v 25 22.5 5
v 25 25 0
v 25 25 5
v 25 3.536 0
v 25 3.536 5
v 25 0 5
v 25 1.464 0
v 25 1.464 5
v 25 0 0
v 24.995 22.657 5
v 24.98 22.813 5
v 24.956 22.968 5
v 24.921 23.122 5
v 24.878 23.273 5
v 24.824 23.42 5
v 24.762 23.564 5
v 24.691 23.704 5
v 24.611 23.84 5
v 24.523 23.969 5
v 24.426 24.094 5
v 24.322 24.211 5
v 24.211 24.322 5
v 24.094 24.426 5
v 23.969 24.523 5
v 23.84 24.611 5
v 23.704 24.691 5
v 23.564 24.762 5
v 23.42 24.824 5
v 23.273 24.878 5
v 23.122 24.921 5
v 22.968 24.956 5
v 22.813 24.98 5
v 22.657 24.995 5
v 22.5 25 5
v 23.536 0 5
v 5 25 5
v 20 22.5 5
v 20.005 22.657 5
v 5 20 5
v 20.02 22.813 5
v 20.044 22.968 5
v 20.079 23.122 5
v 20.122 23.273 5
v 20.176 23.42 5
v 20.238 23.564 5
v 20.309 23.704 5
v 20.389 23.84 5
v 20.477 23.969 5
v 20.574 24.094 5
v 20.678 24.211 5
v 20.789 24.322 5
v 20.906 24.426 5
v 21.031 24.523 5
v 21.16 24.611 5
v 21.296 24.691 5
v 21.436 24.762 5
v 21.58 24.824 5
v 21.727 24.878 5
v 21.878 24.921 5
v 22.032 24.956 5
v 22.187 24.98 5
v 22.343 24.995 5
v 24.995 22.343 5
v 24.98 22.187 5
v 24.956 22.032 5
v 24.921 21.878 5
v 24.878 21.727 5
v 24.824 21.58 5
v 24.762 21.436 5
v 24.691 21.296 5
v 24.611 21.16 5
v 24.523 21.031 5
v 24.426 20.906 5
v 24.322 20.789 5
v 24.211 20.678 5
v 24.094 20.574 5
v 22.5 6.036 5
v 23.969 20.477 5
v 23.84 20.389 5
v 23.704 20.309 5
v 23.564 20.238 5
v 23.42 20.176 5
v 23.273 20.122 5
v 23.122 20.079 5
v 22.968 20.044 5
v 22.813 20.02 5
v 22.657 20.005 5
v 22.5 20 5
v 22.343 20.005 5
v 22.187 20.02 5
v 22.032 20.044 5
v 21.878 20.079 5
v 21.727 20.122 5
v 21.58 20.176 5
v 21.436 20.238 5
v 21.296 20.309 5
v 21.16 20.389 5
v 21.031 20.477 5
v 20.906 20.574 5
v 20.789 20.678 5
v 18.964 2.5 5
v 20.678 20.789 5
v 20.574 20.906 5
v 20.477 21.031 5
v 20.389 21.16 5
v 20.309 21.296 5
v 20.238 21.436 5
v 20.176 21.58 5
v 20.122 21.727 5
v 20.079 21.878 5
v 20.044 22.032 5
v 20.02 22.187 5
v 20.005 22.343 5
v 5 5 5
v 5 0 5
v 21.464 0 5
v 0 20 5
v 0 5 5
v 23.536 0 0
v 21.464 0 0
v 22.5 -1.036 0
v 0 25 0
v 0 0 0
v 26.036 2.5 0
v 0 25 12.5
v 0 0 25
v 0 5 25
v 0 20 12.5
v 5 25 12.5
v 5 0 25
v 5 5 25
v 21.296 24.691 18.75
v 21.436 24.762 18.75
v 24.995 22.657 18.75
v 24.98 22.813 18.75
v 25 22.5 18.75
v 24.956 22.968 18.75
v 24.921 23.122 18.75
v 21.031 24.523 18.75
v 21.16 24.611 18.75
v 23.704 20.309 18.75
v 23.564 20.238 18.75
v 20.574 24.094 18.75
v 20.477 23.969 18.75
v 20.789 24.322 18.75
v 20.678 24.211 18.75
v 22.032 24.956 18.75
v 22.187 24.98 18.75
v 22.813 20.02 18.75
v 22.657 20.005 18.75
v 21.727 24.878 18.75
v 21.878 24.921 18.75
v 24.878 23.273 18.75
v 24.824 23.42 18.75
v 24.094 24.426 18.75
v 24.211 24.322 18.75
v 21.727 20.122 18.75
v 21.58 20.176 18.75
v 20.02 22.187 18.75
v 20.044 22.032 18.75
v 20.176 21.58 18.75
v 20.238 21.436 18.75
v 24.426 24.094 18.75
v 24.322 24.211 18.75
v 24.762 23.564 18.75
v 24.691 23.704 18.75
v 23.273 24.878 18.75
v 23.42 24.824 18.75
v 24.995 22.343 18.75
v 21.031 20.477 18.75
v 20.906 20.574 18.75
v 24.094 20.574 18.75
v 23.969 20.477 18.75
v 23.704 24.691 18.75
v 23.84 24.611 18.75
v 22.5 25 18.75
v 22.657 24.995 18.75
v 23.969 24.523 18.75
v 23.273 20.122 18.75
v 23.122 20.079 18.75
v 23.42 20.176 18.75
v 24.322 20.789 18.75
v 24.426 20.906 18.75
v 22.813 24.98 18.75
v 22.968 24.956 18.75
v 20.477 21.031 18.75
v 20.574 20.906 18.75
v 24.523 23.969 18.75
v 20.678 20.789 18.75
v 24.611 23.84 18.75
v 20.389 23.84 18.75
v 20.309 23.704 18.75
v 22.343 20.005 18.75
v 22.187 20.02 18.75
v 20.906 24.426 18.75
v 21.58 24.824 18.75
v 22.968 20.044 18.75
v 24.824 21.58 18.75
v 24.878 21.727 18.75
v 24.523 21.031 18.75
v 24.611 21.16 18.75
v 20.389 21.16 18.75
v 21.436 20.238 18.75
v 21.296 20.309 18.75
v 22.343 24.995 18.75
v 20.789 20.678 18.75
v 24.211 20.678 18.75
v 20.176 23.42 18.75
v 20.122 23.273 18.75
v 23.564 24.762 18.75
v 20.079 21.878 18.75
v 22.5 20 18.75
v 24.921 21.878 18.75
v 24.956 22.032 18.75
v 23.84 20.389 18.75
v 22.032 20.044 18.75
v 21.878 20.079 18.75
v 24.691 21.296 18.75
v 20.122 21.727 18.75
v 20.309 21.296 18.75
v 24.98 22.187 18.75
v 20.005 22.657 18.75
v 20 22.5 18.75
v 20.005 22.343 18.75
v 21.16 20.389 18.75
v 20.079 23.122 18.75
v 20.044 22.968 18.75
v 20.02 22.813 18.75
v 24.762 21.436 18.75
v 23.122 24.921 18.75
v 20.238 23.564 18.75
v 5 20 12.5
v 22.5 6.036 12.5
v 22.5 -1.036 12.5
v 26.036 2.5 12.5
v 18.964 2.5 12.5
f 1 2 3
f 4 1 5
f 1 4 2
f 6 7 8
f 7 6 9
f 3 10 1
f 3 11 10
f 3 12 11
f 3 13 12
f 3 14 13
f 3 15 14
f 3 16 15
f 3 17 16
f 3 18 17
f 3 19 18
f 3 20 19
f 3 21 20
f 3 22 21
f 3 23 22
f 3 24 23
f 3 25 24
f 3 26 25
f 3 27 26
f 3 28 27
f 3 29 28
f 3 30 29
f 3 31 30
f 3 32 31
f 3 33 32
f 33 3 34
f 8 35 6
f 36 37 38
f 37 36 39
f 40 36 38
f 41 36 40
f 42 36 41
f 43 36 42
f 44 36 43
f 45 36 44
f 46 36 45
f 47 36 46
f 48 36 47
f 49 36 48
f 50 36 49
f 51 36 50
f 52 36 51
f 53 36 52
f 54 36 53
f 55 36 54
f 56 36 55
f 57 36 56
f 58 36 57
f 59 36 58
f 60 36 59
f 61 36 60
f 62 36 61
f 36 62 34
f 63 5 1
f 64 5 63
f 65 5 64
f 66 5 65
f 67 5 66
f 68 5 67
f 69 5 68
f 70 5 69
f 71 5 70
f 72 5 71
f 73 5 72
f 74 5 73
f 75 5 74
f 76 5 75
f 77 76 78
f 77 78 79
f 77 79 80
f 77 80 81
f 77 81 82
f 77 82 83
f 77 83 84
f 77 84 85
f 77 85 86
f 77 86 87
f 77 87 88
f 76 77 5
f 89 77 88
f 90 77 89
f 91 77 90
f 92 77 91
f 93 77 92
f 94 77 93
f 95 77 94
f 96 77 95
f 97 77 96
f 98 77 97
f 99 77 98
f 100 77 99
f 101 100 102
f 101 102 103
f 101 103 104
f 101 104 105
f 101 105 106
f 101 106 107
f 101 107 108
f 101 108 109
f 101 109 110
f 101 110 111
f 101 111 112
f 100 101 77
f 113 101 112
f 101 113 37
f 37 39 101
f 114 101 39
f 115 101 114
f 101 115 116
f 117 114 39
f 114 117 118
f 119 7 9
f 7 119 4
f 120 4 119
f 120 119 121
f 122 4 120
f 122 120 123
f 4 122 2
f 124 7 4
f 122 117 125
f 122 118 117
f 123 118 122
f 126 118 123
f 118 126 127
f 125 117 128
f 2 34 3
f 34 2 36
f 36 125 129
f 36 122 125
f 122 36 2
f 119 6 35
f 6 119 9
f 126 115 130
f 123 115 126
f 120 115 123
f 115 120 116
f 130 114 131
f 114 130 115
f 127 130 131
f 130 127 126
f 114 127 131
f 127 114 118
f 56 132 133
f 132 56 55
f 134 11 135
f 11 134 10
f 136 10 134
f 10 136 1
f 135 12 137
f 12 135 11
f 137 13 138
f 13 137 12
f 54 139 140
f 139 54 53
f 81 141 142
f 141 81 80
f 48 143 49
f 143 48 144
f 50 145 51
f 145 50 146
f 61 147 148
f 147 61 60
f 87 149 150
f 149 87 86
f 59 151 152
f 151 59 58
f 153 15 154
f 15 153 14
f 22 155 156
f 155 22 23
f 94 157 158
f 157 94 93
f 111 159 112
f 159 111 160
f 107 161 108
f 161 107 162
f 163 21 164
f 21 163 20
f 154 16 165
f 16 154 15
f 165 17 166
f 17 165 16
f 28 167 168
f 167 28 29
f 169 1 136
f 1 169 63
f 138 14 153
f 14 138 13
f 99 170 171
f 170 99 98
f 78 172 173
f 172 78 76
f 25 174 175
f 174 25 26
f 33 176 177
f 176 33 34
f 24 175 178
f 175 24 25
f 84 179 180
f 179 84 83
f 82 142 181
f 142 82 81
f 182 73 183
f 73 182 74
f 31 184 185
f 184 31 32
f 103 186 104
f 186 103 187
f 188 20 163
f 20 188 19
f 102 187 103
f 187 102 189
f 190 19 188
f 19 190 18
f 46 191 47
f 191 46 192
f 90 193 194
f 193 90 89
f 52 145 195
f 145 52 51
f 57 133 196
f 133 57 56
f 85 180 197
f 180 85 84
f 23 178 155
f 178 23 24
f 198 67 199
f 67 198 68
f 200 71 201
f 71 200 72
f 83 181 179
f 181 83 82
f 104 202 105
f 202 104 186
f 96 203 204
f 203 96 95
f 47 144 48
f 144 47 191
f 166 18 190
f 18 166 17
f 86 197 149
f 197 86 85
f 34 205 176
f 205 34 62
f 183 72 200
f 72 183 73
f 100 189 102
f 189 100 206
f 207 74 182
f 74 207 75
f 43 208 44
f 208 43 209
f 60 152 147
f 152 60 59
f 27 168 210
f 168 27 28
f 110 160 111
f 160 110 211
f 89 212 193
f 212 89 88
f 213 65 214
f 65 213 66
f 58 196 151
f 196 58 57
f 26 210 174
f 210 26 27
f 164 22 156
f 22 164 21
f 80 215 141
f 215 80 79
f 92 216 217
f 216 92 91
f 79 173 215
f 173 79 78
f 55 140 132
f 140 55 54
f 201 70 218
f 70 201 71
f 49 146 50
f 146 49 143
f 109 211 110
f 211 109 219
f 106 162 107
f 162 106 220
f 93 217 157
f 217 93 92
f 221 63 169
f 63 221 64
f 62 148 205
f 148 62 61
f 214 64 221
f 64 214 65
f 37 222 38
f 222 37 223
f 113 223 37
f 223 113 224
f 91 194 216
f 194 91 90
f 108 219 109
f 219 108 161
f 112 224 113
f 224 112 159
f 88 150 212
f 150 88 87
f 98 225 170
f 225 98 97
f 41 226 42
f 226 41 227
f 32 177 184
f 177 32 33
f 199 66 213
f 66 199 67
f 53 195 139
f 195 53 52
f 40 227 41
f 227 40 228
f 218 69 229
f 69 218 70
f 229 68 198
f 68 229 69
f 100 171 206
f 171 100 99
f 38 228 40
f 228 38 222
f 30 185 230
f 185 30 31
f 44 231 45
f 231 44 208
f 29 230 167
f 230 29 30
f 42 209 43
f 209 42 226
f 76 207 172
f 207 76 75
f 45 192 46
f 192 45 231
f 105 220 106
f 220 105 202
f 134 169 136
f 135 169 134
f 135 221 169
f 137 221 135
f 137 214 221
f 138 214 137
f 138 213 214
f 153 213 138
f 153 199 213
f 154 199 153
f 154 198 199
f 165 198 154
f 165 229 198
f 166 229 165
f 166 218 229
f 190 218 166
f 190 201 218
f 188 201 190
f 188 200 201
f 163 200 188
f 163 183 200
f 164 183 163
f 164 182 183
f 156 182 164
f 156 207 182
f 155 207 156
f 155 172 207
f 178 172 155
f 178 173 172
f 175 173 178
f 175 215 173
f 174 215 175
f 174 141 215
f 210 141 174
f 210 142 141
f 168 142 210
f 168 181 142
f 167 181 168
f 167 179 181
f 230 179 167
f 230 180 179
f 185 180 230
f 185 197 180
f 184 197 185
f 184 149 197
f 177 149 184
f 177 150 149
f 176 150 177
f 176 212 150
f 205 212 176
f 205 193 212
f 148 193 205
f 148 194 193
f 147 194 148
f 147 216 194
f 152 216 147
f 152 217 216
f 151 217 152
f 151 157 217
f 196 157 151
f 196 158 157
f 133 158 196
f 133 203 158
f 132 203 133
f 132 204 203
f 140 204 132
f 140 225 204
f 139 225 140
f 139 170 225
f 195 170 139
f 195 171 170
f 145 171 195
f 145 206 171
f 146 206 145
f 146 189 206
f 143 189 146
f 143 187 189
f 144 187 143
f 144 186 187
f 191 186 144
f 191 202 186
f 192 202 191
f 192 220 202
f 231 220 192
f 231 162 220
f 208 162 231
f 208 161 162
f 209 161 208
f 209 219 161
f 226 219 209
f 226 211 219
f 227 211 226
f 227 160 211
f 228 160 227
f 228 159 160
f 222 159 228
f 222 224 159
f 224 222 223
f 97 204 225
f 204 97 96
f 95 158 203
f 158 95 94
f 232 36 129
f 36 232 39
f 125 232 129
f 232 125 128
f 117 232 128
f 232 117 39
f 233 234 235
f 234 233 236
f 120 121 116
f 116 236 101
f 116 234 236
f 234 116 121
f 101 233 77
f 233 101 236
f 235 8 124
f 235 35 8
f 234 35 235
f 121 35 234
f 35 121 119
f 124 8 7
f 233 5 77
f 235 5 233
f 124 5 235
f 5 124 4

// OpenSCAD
edge = 25;
pillars= 5;

cube(
    [edge,
    edge,
    pillars,
    ],
    center=false);
    
cube(
    [pillars,
    pillars,
    edge,
    ],
    center=false);
    
translate( v = [edge - pillars, edge - pillars, 0] ) {
translate( v = [pillars/2,pillars/2,0] ) {
    cylinder(
    r=pillars/2,
    h=edge*0.75,
    center=false,
    $fn=100);
}
}

translate( v = [0, edge - pillars, 0] ) {
    cube(
    [pillars,
    pillars,
    edge*0.50,
    ],
    center=false);
}

translate( v = [edge - pillars, 0, 0] ) {
translate([pillars/2, pillars/2, 0]) {
rotate([0, 0, 45]) {
translate([-pillars/2, -pillars/2, 0]) {
    cube(
        [pillars,
        pillars,
        edge*0.5,
        ],
        center=false);
}
}
}
}
